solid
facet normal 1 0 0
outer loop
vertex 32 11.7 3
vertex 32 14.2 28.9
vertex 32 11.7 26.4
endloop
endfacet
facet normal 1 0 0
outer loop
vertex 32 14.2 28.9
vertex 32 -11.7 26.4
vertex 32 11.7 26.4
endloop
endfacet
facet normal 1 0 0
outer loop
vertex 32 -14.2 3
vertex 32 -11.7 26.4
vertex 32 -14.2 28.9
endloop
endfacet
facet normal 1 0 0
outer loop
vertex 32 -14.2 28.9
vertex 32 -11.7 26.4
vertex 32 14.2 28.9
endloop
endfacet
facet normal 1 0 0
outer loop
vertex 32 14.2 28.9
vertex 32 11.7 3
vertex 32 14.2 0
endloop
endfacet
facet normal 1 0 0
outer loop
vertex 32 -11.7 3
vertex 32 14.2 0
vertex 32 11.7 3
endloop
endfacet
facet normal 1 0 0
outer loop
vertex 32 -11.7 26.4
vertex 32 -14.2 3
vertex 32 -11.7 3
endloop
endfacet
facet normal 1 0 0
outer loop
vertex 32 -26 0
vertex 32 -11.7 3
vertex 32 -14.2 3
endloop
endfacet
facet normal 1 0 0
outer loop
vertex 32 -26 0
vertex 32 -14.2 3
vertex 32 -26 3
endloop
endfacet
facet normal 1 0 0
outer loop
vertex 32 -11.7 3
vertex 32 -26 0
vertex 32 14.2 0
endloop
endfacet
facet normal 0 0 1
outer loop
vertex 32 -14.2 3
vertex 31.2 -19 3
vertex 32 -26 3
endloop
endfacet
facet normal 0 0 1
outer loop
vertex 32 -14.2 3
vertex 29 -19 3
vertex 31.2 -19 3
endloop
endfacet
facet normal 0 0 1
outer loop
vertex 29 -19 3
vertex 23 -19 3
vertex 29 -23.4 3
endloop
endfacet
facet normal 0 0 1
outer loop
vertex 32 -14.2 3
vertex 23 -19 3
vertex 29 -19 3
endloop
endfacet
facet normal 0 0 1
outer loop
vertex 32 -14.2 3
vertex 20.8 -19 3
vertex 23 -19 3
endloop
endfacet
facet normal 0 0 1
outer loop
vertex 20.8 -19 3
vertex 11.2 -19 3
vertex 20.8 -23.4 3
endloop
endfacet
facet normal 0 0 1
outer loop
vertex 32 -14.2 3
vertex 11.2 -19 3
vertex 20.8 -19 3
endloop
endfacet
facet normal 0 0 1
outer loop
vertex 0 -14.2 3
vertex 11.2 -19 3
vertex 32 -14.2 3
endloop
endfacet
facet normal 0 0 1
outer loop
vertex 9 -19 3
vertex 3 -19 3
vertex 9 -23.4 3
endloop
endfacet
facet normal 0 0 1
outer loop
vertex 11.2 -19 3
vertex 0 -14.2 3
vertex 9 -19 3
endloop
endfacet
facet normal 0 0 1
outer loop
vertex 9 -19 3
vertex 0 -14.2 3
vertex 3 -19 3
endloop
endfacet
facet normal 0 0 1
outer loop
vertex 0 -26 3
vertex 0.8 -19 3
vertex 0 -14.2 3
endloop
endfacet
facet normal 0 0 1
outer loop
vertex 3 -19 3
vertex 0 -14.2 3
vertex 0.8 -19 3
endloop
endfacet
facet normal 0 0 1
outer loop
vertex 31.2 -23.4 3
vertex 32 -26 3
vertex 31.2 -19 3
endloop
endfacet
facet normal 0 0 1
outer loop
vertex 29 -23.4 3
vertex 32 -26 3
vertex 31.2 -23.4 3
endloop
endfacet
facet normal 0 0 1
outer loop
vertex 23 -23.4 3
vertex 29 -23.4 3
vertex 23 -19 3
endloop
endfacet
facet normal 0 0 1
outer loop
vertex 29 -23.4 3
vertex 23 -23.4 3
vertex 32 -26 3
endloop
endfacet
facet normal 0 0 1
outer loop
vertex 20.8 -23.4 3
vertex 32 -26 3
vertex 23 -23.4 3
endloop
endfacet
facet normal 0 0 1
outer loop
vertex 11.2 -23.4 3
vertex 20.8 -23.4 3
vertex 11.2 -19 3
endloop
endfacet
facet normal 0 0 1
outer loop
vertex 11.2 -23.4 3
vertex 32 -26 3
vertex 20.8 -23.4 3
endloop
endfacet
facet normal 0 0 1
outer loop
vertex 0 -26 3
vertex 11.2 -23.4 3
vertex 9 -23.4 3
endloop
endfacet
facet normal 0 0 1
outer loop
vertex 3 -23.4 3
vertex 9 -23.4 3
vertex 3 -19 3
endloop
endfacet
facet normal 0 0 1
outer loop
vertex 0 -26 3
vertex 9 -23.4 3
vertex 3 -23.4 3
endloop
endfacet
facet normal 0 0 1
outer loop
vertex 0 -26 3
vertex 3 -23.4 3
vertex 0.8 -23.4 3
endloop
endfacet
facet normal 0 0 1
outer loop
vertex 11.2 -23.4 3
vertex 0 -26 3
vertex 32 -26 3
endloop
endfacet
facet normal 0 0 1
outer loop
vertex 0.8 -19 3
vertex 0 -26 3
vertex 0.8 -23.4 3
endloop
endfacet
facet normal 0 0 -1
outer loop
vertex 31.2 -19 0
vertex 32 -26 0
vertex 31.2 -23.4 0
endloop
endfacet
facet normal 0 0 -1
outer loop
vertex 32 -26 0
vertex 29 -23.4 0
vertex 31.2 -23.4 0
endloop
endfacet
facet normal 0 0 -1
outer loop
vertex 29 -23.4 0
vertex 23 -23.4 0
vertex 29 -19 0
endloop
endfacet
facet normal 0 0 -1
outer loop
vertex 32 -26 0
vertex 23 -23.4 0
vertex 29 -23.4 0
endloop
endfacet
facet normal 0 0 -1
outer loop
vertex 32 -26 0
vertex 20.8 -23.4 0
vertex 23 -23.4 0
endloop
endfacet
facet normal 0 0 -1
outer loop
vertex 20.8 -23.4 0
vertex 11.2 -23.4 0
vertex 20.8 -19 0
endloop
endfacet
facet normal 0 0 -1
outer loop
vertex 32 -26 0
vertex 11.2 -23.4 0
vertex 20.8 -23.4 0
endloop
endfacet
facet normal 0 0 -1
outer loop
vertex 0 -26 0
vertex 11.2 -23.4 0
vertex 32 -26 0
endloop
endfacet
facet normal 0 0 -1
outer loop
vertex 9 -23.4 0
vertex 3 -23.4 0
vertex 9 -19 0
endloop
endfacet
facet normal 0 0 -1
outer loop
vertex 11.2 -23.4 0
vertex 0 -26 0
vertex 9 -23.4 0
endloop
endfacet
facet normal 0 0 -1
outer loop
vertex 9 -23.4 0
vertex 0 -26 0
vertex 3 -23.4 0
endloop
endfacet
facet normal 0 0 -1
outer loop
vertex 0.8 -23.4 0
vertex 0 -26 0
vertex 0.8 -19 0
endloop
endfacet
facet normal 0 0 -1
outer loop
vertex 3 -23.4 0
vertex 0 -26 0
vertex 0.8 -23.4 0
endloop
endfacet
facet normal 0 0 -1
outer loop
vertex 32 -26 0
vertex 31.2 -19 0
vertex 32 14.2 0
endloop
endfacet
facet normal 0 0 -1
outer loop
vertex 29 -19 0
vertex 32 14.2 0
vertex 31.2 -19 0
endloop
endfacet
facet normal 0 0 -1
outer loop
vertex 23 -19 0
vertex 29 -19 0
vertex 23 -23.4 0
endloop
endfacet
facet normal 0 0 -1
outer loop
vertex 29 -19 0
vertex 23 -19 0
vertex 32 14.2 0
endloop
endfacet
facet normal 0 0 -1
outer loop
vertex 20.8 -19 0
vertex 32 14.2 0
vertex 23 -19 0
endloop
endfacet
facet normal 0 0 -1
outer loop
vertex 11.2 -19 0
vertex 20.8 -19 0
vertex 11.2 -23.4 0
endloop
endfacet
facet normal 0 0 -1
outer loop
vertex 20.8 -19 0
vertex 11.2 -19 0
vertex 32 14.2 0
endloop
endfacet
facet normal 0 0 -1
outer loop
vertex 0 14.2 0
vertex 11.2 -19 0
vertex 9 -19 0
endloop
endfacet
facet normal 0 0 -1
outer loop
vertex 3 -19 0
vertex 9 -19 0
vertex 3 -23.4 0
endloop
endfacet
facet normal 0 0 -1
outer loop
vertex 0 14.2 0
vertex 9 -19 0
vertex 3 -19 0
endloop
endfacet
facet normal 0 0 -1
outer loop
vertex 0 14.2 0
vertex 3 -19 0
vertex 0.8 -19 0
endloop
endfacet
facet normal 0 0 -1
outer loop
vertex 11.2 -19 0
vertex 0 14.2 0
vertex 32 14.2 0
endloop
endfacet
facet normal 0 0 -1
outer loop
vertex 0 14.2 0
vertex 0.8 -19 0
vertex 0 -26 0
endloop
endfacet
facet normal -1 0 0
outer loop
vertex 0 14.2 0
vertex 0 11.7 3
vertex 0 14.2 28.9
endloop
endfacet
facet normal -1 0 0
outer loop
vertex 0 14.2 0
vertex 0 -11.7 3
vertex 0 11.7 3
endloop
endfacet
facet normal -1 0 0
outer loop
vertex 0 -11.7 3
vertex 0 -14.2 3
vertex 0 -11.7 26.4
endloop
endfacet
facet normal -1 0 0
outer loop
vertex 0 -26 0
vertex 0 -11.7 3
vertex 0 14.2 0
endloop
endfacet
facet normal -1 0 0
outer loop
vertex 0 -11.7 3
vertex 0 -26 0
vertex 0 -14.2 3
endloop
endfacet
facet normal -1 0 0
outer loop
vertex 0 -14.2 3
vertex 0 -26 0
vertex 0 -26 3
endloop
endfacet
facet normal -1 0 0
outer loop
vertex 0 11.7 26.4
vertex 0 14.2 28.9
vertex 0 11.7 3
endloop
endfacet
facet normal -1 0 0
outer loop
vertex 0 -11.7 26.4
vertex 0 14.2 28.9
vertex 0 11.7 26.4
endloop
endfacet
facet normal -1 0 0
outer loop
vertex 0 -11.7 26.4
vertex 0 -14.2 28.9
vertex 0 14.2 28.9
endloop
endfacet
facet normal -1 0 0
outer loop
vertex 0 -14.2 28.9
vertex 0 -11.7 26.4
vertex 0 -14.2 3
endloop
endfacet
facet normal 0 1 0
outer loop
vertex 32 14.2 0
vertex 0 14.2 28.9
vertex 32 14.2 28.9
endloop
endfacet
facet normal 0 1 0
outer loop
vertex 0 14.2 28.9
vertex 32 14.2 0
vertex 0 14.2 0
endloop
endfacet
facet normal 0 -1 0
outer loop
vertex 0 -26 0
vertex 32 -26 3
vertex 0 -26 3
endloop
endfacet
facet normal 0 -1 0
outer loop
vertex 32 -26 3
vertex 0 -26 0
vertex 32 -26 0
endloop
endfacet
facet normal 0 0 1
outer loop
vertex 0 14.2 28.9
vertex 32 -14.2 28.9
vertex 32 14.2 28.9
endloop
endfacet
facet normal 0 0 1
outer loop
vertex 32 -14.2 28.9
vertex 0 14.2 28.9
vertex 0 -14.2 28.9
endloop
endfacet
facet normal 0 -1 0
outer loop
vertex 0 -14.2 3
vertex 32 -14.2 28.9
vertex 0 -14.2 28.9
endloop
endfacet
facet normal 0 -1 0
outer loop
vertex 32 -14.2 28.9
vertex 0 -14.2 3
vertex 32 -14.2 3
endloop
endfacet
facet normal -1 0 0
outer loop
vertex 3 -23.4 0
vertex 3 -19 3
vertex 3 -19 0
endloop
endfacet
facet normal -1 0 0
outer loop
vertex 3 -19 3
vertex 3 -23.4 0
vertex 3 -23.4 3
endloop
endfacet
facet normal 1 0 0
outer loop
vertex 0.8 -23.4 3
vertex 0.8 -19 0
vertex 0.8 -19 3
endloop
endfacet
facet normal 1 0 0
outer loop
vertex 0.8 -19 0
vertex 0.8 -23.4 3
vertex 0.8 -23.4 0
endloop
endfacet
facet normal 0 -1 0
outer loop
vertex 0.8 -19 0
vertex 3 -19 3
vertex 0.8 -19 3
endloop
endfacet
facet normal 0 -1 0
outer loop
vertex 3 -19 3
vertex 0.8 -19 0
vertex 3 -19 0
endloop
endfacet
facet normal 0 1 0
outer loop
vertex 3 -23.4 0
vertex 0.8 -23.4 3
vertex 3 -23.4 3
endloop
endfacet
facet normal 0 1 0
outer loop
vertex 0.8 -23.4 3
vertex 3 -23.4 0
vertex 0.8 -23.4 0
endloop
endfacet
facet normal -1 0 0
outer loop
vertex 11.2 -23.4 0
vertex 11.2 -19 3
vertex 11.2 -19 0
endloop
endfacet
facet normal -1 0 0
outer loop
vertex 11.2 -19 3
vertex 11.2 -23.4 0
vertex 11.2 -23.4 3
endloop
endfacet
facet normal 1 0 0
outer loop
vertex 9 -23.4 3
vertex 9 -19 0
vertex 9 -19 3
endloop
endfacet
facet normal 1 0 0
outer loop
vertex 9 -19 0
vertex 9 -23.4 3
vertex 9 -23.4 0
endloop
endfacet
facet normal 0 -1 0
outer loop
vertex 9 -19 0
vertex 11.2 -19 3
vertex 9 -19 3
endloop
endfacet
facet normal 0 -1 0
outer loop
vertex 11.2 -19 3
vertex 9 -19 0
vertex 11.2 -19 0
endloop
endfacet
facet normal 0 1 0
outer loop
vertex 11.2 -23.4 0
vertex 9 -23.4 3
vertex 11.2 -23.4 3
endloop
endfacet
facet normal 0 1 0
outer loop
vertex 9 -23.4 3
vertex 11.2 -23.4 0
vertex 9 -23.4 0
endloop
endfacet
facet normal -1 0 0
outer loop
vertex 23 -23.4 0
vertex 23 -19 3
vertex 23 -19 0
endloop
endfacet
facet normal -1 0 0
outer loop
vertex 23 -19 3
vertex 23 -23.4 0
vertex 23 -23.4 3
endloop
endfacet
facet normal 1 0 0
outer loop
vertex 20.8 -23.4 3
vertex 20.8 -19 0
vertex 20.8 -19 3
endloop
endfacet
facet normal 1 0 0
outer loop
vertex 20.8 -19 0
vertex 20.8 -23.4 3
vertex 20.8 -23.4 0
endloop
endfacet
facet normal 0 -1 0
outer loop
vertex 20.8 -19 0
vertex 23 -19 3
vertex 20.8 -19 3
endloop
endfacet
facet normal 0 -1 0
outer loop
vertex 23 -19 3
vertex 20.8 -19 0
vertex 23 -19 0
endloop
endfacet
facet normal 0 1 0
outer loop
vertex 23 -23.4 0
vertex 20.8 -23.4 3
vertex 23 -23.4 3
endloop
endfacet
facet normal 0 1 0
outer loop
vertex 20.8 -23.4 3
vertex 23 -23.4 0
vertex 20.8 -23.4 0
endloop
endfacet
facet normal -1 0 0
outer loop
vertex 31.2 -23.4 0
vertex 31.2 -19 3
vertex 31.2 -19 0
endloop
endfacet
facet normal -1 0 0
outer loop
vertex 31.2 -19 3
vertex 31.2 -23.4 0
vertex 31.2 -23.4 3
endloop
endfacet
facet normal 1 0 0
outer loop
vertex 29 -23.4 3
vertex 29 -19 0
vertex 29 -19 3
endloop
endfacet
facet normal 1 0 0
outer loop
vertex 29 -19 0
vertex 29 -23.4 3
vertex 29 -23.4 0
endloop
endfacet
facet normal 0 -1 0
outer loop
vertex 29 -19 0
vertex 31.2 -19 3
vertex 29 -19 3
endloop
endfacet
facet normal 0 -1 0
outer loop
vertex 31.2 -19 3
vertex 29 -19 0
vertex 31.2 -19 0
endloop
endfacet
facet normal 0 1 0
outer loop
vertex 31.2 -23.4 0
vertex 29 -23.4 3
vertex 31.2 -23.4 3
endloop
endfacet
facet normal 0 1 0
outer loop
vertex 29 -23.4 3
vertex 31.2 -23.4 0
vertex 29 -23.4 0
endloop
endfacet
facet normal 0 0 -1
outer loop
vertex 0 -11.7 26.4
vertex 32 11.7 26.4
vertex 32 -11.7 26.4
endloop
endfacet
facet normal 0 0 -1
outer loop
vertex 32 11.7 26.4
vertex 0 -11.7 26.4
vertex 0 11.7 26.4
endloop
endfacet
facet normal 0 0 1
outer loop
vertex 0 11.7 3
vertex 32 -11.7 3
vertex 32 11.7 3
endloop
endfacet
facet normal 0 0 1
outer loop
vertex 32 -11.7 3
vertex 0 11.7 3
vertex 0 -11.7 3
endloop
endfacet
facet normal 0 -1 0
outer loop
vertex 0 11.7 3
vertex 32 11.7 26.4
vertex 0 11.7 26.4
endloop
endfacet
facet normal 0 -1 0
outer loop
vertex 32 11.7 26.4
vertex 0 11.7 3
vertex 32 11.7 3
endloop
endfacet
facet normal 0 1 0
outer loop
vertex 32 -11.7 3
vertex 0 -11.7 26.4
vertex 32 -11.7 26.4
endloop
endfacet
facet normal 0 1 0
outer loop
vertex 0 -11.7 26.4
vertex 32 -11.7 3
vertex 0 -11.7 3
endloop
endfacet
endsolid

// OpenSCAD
// ======================================================================
//  ТРИМАЧ TT-МОТОРА · sosny · BEST EC Day 2 (TD)
//
//  Тунель під мотор + полиця з прорізами під стяжки. Кріпиться знизу
//  рами на ламель (крок ламелей 20 мм = крок пар прорізів).
//  Мотор заходить у тунель заднім кінцем (де дроти), вихідний вал
//  лишається зовні — тунель його не перекриває.
//  Полиця тільки з ВНУТРІШНЬОГО боку: зовнішня стінка тунелю ставиться
//  врівень із краєм рами, тож колесо нічого не зачіпає. Друкувати 2 шт:
//  для другого боку деталь просто розвертається на 180° (універсальна).
//
//  25.10 15:40: мотор не влазив — товщина тунелю 20 → 23 мм (заміряно).
//  Висота 23 і висота вала над рамою (14.7) не змінились — колеса рівні.
//
//  Осі: X — уздовж мотора, Y — вздовж вала (23 мм), Z — висота (23 мм).
//  Друк: PLA, шар 0.2, 4 периметри, 30 %, полицею на стіл, без підтримок.
// ======================================================================

mot_y   = 23;      // товщина мотора (вздовж вала) — було 20
mot_z   = 23;      // висота мотора
fit     = 0.4;     // зазор (тугіше → 0.2)
len_x   = 32;      // довжина тунелю (вал мотора лишається вільним)
wall    = 2.5;
flange_t = 3;      // товщина полиці
flange_in = 26;    // полиця всередину рами від осі тунелю (зовні — врівень зі стінкою)
slot_l  = 4.4;     // проріз під стяжку до 3.6 мм (уздовж Y)
slot_w  = 2.2;     // (уздовж X)
slat_pitch = 20;   // крок ламелей рами
slat_w  = 5;

in_y = mot_y + fit;
in_z = mot_z + fit;
out_y = in_y + 2*wall;

difference() {
    union() {
        // полиця (лягає на раму)
        translate([0, -flange_in, 0]) cube([len_x, flange_in + out_y/2, flange_t]);
        // тунель
        translate([0, -out_y/2, 0]) cube([len_x, out_y, flange_t + in_z + wall]);
    }
    // порожнина під мотор
    translate([-1, -in_y/2, flange_t]) cube([len_x + 2, in_y, in_z]);
    // прорізи під стяжки: пари обабіч ламелі, з внутрішнього боку тунелю
    xc0 = (len_x - slat_pitch)/2;
    for (xc = [xc0, xc0 + slat_pitch], dx = [-1, 1])
        translate([xc + dx*(slat_w/2 + 0.5 + slot_w/2) - slot_w/2,
                   -(out_y/2 + 7) - slot_l/2, -1])
            cube([slot_w, slot_l, flange_t + 2]);
}
